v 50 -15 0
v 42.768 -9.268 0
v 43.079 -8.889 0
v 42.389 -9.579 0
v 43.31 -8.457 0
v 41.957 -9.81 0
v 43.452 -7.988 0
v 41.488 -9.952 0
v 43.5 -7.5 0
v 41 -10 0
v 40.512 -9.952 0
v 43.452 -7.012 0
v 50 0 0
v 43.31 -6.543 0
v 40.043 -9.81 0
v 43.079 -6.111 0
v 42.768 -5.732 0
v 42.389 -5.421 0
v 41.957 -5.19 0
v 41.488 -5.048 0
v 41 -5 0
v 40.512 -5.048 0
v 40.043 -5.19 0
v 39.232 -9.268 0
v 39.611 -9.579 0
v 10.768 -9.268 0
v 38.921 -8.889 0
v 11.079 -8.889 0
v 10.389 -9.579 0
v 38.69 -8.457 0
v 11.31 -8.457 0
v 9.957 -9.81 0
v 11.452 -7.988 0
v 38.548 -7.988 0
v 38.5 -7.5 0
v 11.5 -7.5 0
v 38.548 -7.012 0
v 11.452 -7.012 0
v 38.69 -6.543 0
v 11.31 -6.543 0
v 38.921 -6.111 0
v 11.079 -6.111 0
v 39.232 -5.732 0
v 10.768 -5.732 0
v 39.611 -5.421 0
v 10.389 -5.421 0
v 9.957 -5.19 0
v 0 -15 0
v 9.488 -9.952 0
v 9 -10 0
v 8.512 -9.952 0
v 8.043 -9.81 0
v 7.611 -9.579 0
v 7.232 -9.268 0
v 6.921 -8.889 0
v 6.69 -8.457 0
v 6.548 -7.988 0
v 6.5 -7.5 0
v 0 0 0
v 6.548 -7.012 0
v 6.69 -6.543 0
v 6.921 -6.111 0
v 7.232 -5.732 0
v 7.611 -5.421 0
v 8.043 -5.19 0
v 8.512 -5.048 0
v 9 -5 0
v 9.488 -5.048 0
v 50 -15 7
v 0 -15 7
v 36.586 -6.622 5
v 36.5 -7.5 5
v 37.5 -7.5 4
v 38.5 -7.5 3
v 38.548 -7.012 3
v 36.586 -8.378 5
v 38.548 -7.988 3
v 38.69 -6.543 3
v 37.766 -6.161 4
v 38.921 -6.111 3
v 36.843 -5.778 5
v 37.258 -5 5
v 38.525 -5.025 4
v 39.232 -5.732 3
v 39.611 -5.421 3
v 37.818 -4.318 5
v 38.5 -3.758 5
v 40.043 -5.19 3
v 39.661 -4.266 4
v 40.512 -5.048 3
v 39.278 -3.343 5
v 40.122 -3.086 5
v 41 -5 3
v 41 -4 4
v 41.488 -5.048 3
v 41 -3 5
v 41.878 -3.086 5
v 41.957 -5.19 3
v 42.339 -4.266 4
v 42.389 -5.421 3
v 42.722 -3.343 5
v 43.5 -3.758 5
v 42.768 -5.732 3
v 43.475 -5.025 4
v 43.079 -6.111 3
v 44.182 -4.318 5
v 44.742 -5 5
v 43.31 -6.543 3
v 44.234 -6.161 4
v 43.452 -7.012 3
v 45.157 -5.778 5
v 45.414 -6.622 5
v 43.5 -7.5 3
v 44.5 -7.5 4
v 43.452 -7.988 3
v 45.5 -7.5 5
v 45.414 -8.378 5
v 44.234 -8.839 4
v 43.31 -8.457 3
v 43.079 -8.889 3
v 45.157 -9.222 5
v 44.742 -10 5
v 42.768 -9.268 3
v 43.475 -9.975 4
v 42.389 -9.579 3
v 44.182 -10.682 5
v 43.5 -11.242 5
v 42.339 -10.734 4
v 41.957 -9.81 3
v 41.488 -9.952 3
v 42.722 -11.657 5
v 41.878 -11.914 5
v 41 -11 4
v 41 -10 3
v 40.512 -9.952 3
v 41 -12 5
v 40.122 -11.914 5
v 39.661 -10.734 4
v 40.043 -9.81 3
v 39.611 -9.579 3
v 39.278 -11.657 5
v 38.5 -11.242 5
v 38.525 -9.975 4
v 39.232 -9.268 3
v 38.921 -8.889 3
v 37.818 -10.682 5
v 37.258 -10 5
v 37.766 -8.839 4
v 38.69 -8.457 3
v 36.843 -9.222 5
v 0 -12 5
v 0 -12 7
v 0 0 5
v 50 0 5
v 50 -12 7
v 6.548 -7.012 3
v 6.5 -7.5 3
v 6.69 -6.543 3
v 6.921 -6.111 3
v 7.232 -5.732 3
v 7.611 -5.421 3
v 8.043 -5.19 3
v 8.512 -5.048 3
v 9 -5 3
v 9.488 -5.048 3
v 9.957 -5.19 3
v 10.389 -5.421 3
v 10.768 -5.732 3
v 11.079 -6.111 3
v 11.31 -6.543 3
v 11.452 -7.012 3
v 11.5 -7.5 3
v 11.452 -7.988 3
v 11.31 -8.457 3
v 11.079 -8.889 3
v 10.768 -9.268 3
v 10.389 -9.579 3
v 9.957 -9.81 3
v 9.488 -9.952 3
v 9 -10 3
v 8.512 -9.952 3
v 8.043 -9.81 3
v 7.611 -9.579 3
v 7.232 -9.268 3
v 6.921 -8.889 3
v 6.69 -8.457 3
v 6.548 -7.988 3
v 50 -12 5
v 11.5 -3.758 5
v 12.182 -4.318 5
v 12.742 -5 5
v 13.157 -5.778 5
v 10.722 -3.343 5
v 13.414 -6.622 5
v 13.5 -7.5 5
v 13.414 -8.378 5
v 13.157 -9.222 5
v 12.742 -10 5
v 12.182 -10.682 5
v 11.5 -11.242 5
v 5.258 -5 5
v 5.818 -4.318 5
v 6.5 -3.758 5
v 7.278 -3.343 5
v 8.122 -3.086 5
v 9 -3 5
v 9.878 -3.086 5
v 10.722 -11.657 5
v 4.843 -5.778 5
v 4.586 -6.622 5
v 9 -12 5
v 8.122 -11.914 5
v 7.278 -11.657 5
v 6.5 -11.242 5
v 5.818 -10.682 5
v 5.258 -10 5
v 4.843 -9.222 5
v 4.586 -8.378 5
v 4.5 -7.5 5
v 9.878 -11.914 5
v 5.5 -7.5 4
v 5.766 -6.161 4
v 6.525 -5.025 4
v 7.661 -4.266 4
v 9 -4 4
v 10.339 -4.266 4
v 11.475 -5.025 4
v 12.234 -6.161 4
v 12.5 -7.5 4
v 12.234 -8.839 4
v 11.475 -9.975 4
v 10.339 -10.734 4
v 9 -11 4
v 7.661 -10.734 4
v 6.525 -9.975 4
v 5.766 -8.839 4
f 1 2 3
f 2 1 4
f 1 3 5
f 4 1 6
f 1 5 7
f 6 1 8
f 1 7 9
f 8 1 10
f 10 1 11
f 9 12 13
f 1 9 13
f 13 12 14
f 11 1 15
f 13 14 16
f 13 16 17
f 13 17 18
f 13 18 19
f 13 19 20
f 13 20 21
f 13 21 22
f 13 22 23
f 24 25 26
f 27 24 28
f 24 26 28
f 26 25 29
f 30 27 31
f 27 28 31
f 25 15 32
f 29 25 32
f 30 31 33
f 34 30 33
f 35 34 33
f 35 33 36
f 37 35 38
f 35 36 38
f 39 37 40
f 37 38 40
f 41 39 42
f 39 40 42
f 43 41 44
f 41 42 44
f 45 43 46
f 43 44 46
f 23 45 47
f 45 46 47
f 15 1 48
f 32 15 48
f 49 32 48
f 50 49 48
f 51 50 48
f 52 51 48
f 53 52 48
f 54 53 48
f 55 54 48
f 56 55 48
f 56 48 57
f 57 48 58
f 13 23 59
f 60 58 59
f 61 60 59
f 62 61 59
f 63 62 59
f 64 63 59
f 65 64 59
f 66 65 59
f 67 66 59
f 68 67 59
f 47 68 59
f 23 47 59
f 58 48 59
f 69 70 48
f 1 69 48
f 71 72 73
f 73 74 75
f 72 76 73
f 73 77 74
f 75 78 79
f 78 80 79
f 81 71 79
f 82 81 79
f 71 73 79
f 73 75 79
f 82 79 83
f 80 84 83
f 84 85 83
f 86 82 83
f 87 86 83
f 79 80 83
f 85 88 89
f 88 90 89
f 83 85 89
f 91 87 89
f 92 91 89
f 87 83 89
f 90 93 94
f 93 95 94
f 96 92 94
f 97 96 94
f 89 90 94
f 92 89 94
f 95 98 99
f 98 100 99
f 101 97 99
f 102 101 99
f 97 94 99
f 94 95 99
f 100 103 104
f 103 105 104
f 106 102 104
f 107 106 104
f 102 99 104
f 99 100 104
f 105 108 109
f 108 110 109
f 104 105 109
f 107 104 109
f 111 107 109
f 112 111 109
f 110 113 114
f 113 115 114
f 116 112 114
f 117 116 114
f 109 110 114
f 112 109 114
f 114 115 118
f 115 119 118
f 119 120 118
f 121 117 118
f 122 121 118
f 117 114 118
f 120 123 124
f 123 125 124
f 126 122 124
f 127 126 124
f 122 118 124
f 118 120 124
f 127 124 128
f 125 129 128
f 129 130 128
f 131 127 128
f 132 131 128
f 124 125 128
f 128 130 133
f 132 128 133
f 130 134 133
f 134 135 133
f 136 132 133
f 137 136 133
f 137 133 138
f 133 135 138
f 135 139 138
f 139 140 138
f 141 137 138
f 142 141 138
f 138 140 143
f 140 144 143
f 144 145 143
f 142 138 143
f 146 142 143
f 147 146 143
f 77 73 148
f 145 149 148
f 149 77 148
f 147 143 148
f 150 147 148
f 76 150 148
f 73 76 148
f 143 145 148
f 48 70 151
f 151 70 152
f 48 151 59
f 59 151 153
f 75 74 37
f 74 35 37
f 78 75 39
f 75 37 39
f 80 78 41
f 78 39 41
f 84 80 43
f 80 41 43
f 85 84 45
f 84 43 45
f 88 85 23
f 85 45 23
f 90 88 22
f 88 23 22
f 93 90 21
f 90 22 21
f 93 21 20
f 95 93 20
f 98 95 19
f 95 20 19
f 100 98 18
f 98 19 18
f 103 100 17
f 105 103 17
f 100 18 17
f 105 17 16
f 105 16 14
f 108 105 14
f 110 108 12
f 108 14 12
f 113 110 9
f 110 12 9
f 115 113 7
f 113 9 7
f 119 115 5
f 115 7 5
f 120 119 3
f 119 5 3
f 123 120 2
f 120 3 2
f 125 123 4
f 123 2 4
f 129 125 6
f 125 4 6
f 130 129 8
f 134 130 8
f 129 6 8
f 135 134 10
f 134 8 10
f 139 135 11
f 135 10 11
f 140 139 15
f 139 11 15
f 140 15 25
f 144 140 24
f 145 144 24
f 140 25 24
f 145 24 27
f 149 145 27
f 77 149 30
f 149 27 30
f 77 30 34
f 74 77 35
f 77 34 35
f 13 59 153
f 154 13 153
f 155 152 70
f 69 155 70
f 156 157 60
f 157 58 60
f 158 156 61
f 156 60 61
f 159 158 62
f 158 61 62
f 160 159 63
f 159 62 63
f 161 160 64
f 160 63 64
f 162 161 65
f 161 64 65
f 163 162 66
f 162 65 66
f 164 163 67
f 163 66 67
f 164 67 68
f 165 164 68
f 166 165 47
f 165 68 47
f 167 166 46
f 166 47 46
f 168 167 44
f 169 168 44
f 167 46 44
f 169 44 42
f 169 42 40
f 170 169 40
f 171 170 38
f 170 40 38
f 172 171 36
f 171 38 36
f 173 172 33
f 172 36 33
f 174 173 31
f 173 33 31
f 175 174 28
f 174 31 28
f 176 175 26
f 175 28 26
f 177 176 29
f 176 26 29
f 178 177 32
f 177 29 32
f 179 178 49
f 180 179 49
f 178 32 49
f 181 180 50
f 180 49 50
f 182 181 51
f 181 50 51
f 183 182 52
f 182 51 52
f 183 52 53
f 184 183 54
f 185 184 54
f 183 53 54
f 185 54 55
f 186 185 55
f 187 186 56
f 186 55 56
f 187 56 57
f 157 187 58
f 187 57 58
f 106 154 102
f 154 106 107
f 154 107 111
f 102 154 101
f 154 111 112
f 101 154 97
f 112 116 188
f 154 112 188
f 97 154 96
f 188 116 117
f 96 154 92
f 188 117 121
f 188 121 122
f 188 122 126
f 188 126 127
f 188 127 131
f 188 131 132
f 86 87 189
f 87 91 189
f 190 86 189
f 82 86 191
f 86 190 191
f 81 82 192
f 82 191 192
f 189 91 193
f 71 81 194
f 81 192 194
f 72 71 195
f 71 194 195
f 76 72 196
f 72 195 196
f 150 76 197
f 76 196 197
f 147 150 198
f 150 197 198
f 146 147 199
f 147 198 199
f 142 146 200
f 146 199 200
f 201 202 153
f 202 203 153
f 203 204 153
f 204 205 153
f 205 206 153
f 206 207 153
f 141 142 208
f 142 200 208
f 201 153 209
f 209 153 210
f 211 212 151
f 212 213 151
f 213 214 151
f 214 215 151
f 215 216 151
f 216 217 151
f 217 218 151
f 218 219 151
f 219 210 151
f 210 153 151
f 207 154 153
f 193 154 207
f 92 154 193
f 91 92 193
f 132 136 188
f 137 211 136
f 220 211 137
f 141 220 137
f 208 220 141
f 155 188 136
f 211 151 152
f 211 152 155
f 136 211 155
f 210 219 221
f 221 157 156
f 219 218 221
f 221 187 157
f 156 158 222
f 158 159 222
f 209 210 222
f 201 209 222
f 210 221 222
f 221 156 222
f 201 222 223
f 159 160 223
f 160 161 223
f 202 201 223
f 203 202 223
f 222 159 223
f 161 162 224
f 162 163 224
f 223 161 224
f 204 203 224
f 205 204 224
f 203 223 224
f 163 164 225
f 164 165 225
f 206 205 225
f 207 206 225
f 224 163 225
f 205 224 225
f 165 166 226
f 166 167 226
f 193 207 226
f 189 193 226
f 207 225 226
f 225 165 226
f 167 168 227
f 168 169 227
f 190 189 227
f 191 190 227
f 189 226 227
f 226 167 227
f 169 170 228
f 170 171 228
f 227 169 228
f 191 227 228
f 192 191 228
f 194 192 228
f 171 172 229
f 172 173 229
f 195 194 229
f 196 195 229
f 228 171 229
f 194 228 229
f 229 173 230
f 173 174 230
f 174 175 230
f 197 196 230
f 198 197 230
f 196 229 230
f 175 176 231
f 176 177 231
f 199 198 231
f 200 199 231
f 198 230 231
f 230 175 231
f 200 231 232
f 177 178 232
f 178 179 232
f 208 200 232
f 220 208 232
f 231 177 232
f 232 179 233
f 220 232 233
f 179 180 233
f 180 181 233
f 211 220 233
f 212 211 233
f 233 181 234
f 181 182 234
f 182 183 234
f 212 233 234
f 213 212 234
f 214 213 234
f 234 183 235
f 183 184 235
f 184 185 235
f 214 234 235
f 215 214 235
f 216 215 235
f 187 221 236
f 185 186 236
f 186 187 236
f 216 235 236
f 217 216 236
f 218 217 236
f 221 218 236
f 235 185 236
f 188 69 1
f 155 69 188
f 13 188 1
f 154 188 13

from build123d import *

# Parameters (mm, degrees)
F1_DEPTH       = 50
F3_D           = 5
F3_CSINK_D     = 9
F3_CSINK_ANGLE = 90


with BuildPart() as f1:
    # F0 (on Right) → F1 (new body)
    with BuildSketch(Plane.YZ):
        Polygon((-15, 0), (0, 0), (0, 5), (-12, 5), (-12, 7), (-15, 7), (-15, 5), align=None)
    extrude(amount=F1_DEPTH)

    # F3 (through all)
    with Locations(Plane.XY.offset(5)):
        with Locations((41, -7.5), (9, -7.5)):
            CounterSinkHole(F3_D / 2, F3_CSINK_D / 2, counter_sink_angle=F3_CSINK_ANGLE)


solid = f1.part
